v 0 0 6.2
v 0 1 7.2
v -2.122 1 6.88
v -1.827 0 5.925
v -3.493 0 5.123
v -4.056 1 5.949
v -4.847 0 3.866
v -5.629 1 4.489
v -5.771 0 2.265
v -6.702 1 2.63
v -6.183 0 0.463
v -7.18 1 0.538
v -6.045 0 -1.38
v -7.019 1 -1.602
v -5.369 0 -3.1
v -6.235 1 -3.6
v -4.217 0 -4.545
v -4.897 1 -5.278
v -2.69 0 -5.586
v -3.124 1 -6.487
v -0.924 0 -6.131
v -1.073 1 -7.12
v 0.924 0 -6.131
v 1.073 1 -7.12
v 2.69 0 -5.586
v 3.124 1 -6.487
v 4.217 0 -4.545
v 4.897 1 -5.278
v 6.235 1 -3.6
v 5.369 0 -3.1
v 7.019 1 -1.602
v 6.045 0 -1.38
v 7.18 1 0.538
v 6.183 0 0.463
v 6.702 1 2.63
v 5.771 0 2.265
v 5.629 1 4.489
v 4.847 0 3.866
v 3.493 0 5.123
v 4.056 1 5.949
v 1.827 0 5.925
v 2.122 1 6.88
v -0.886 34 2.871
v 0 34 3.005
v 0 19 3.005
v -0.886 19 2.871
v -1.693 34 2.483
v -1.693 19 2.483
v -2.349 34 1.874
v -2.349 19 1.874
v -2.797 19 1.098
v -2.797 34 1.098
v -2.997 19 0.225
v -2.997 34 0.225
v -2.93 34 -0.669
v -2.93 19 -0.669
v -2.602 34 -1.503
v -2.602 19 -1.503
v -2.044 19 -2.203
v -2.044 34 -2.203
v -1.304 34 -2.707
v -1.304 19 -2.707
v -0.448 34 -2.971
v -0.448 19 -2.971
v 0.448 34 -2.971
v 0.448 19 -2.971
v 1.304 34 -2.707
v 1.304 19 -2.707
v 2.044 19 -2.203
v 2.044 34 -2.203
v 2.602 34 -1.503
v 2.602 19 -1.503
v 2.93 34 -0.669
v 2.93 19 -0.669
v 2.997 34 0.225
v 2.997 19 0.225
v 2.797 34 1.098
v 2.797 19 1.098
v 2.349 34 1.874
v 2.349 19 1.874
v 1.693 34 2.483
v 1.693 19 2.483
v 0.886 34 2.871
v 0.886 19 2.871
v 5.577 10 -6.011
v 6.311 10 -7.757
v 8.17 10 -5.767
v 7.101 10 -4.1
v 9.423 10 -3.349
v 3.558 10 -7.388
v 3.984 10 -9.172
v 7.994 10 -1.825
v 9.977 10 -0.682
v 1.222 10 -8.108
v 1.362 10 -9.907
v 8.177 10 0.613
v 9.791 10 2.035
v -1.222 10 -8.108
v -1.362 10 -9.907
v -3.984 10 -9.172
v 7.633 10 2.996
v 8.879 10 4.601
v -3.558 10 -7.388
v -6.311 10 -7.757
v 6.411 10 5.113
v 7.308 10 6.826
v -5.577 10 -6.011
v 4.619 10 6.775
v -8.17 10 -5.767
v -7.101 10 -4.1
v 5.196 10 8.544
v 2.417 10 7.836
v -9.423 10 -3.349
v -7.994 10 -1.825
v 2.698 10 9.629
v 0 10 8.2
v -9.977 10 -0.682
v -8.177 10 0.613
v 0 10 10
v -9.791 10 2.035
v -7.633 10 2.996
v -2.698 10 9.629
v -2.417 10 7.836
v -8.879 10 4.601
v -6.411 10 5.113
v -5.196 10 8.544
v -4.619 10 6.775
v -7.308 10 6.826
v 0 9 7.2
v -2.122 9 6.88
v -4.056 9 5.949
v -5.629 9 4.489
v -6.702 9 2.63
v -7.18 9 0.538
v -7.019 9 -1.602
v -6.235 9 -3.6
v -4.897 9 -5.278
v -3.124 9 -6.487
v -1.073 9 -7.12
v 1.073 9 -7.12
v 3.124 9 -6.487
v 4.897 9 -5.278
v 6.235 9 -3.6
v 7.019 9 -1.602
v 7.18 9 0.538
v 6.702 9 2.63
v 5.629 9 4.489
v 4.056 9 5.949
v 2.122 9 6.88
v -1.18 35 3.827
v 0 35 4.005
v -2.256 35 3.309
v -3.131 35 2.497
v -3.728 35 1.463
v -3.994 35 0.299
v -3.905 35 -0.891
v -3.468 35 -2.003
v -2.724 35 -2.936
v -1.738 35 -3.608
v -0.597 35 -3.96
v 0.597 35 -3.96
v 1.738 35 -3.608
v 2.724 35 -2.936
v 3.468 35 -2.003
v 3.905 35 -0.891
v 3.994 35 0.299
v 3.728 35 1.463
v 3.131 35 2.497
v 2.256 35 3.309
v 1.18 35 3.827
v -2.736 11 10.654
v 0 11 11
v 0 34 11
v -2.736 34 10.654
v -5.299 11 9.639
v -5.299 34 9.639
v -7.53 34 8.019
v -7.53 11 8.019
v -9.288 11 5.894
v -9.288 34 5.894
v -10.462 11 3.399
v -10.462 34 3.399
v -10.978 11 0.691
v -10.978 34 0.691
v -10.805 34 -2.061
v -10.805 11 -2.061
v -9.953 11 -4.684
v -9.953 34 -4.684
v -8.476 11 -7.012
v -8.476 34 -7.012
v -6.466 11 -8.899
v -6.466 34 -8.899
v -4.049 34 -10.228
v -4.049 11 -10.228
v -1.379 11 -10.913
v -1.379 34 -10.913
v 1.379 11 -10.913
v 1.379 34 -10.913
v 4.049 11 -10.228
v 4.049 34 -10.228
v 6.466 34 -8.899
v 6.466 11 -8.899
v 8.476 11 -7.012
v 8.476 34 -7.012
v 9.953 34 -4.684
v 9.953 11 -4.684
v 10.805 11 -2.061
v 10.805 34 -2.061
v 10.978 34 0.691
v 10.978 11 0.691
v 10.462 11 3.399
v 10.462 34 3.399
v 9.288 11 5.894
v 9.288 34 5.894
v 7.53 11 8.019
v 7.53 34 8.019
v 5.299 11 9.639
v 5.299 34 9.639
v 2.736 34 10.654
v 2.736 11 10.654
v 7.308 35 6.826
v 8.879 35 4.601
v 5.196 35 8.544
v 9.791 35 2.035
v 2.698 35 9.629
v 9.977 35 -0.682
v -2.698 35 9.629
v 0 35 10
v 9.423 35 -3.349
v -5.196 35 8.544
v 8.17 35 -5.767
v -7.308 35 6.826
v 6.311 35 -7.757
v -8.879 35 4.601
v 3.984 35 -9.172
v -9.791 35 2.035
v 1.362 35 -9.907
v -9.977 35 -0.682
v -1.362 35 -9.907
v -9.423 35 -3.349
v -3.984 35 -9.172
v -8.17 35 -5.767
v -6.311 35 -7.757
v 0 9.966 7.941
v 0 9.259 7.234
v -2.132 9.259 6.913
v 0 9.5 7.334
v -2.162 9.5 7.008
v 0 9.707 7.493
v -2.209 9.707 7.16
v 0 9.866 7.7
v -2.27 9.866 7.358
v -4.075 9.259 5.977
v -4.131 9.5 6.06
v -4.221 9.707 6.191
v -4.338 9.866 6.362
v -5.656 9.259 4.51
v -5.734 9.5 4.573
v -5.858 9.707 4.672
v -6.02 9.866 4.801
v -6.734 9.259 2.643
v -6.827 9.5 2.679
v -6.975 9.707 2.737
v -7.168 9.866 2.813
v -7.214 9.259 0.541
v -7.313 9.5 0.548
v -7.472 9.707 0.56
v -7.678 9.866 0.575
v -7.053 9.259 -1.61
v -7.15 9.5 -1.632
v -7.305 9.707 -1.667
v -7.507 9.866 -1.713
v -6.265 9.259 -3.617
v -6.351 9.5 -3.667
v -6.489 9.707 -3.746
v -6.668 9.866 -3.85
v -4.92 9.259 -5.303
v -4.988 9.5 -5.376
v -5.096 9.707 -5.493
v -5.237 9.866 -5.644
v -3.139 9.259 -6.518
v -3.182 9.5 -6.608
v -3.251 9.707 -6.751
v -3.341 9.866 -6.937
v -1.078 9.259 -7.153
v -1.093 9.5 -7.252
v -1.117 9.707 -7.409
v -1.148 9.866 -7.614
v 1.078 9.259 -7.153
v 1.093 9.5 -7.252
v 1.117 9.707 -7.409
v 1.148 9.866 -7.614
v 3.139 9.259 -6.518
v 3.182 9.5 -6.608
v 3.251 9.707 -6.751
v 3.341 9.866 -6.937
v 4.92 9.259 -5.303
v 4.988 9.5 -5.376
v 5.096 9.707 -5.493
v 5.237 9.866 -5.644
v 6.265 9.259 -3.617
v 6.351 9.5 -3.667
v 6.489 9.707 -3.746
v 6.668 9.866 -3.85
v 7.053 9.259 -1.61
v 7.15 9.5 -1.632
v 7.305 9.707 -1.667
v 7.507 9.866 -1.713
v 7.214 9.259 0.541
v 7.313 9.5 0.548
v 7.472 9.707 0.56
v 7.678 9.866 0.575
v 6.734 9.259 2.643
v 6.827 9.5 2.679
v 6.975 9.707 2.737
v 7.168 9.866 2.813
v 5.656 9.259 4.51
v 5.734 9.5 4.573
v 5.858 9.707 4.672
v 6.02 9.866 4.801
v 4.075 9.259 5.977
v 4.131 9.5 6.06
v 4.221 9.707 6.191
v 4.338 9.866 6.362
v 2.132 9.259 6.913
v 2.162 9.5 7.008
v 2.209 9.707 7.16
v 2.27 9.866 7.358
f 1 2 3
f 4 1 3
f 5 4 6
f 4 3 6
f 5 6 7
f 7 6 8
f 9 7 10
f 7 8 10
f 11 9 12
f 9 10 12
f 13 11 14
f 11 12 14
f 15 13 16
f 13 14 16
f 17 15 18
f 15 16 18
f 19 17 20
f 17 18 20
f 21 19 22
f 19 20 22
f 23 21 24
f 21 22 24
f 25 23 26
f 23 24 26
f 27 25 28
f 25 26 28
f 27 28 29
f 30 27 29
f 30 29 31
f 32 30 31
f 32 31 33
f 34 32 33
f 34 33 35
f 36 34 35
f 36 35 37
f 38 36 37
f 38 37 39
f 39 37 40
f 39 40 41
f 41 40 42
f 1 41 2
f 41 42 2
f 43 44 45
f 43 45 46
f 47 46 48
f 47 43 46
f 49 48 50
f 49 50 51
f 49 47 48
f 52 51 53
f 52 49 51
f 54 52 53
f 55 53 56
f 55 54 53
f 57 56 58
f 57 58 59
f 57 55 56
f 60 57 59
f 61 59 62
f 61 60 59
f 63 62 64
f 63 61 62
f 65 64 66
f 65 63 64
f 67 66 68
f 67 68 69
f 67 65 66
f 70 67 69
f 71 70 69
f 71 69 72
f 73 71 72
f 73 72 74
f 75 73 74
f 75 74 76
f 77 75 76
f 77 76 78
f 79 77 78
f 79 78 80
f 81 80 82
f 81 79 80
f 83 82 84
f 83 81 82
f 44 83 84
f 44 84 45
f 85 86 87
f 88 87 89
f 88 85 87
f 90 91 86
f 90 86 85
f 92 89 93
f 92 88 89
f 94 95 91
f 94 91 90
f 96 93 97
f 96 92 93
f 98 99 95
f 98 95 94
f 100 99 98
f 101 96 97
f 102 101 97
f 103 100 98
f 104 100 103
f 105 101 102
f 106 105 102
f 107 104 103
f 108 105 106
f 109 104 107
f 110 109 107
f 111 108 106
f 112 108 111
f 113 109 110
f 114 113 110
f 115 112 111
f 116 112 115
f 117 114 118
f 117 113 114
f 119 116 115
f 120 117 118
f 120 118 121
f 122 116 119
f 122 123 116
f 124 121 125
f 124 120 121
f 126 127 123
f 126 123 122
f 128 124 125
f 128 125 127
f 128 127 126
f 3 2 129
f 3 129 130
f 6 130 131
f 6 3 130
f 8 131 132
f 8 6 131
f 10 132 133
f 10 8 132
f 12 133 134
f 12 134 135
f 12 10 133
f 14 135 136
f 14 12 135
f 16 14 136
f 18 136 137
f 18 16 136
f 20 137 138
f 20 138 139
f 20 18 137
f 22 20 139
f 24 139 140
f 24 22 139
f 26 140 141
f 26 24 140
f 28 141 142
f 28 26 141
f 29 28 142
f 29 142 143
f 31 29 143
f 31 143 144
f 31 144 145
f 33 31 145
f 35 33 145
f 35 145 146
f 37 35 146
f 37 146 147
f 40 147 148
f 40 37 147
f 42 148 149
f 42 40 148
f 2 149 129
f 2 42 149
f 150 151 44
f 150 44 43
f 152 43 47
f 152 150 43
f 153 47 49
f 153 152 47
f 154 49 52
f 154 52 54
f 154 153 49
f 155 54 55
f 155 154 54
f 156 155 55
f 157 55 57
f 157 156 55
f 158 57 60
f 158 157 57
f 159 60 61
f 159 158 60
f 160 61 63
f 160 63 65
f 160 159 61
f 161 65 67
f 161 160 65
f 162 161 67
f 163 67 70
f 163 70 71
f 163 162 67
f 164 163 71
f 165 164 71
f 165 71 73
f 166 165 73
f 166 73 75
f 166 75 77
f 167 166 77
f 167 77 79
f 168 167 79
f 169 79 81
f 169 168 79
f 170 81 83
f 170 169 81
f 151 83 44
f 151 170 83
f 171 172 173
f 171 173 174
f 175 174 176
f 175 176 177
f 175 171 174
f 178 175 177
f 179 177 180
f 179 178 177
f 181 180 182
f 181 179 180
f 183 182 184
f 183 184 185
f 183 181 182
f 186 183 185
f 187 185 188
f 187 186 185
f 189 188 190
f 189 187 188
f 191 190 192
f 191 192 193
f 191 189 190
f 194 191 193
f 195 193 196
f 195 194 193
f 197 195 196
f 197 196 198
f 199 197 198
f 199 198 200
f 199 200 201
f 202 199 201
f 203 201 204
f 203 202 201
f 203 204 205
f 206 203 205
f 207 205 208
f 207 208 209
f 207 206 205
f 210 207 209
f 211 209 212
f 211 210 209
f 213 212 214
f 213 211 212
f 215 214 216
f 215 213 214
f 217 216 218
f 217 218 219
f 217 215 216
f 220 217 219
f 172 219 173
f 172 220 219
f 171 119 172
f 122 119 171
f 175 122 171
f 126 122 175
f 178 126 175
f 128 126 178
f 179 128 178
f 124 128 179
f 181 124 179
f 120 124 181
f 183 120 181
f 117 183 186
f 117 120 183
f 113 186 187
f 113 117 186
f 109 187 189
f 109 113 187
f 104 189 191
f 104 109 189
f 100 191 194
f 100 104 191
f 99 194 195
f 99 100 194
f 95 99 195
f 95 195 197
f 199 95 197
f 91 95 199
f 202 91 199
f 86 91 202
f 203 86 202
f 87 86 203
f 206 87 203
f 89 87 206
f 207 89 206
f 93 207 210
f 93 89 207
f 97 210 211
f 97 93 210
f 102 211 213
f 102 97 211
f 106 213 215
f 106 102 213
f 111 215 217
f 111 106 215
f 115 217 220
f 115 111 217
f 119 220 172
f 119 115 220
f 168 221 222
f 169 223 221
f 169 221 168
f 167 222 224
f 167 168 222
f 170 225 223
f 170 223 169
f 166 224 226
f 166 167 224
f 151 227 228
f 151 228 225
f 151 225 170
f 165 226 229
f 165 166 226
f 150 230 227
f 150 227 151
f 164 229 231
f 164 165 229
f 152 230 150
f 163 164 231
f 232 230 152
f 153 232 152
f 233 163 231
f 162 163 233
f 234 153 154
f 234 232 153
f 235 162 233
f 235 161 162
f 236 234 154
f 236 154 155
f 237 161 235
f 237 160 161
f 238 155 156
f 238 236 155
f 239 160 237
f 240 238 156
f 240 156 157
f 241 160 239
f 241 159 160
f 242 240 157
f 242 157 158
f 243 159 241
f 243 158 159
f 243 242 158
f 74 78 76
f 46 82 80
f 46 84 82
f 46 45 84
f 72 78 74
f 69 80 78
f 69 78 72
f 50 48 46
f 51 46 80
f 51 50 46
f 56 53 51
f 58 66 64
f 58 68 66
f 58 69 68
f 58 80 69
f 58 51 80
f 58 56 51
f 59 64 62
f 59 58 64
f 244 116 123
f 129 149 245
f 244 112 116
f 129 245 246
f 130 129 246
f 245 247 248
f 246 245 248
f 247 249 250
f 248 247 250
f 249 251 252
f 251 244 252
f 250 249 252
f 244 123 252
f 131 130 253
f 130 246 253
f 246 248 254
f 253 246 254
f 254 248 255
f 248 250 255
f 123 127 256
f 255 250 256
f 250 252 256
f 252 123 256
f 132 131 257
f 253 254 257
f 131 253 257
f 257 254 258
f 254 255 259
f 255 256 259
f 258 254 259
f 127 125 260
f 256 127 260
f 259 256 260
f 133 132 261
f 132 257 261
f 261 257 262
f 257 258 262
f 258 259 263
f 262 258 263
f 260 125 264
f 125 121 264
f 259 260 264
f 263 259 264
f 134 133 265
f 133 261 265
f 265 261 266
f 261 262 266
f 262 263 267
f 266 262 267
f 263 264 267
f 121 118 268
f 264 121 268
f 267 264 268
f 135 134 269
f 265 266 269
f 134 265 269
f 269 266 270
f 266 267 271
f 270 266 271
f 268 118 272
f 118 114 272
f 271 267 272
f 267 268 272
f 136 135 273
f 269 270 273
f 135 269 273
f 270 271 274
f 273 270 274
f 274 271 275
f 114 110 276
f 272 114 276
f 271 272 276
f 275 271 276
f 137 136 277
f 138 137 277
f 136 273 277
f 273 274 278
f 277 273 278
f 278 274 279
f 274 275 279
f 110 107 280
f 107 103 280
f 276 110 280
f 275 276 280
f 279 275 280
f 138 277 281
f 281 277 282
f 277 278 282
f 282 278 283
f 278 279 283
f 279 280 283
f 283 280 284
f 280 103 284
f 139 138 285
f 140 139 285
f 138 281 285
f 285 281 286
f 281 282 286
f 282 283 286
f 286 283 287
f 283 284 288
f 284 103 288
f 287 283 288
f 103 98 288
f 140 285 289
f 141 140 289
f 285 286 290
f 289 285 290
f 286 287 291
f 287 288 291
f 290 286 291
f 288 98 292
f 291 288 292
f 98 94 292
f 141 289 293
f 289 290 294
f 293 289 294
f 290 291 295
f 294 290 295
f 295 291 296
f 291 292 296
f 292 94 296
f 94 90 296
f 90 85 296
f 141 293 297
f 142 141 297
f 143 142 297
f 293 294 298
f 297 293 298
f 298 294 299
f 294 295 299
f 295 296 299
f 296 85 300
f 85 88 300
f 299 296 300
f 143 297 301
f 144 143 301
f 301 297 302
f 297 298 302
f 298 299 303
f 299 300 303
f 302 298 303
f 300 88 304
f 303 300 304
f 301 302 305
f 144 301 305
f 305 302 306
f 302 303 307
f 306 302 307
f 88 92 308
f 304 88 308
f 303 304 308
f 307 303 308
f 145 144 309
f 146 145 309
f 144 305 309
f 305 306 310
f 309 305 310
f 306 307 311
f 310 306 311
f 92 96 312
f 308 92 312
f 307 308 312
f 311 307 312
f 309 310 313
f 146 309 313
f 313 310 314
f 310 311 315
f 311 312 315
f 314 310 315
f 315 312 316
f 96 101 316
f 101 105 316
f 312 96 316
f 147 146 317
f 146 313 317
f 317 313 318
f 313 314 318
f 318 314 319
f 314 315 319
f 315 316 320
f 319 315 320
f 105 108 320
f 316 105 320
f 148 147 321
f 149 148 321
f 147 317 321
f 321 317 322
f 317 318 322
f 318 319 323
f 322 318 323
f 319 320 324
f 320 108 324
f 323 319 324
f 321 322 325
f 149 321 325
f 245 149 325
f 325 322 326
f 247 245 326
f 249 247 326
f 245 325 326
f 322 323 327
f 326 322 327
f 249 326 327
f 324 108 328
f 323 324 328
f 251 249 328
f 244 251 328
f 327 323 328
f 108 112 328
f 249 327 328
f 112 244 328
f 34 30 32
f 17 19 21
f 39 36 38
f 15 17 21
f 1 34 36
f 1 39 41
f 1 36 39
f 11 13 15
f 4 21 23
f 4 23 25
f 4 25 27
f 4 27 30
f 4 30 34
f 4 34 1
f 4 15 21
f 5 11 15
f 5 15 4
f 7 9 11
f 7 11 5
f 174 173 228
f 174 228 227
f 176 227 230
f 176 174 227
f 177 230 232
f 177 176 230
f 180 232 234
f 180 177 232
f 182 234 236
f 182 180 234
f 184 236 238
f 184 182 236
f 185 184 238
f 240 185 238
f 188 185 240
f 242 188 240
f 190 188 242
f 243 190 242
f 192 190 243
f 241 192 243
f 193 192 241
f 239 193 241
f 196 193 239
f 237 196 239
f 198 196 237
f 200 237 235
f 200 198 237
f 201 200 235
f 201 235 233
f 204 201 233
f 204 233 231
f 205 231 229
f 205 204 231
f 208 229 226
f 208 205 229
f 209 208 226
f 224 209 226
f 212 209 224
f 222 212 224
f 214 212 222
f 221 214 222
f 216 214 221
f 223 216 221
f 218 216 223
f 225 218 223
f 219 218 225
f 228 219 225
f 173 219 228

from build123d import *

# Parameters (mm, degrees)
F2_SIZE = 1
F3_R    = 1


with BuildPart() as f1:
    # F0 (on Right) → F1 (revolve)
    with BuildSketch(Plane.YZ):
        Polygon((0, 7.2), (0, 0), (19, 0), (19, 3.005), (35, 3.005), (35, 11), (10, 11), (10, 7.2), align=None)
    revolve(axis=Axis((0, 9.5, 0), (0, -1, 0)))

    # F2
    f2_edges = [f1.edges().sort_by_distance(p)[0] for p in [
        (0, 0, -7.2),
        (0, 10, -11),
        (0, 35, -11),
        (0, 35, -3.005),
    ]]
    chamfer(f2_edges, length=F2_SIZE)

    # F3
    f3_edges = [f1.edges().sort_by_distance(p)[0] for p in [
        (0, 10, -7.2),
    ]]
    fillet(f3_edges, radius=F3_R)


solid = f1.part
